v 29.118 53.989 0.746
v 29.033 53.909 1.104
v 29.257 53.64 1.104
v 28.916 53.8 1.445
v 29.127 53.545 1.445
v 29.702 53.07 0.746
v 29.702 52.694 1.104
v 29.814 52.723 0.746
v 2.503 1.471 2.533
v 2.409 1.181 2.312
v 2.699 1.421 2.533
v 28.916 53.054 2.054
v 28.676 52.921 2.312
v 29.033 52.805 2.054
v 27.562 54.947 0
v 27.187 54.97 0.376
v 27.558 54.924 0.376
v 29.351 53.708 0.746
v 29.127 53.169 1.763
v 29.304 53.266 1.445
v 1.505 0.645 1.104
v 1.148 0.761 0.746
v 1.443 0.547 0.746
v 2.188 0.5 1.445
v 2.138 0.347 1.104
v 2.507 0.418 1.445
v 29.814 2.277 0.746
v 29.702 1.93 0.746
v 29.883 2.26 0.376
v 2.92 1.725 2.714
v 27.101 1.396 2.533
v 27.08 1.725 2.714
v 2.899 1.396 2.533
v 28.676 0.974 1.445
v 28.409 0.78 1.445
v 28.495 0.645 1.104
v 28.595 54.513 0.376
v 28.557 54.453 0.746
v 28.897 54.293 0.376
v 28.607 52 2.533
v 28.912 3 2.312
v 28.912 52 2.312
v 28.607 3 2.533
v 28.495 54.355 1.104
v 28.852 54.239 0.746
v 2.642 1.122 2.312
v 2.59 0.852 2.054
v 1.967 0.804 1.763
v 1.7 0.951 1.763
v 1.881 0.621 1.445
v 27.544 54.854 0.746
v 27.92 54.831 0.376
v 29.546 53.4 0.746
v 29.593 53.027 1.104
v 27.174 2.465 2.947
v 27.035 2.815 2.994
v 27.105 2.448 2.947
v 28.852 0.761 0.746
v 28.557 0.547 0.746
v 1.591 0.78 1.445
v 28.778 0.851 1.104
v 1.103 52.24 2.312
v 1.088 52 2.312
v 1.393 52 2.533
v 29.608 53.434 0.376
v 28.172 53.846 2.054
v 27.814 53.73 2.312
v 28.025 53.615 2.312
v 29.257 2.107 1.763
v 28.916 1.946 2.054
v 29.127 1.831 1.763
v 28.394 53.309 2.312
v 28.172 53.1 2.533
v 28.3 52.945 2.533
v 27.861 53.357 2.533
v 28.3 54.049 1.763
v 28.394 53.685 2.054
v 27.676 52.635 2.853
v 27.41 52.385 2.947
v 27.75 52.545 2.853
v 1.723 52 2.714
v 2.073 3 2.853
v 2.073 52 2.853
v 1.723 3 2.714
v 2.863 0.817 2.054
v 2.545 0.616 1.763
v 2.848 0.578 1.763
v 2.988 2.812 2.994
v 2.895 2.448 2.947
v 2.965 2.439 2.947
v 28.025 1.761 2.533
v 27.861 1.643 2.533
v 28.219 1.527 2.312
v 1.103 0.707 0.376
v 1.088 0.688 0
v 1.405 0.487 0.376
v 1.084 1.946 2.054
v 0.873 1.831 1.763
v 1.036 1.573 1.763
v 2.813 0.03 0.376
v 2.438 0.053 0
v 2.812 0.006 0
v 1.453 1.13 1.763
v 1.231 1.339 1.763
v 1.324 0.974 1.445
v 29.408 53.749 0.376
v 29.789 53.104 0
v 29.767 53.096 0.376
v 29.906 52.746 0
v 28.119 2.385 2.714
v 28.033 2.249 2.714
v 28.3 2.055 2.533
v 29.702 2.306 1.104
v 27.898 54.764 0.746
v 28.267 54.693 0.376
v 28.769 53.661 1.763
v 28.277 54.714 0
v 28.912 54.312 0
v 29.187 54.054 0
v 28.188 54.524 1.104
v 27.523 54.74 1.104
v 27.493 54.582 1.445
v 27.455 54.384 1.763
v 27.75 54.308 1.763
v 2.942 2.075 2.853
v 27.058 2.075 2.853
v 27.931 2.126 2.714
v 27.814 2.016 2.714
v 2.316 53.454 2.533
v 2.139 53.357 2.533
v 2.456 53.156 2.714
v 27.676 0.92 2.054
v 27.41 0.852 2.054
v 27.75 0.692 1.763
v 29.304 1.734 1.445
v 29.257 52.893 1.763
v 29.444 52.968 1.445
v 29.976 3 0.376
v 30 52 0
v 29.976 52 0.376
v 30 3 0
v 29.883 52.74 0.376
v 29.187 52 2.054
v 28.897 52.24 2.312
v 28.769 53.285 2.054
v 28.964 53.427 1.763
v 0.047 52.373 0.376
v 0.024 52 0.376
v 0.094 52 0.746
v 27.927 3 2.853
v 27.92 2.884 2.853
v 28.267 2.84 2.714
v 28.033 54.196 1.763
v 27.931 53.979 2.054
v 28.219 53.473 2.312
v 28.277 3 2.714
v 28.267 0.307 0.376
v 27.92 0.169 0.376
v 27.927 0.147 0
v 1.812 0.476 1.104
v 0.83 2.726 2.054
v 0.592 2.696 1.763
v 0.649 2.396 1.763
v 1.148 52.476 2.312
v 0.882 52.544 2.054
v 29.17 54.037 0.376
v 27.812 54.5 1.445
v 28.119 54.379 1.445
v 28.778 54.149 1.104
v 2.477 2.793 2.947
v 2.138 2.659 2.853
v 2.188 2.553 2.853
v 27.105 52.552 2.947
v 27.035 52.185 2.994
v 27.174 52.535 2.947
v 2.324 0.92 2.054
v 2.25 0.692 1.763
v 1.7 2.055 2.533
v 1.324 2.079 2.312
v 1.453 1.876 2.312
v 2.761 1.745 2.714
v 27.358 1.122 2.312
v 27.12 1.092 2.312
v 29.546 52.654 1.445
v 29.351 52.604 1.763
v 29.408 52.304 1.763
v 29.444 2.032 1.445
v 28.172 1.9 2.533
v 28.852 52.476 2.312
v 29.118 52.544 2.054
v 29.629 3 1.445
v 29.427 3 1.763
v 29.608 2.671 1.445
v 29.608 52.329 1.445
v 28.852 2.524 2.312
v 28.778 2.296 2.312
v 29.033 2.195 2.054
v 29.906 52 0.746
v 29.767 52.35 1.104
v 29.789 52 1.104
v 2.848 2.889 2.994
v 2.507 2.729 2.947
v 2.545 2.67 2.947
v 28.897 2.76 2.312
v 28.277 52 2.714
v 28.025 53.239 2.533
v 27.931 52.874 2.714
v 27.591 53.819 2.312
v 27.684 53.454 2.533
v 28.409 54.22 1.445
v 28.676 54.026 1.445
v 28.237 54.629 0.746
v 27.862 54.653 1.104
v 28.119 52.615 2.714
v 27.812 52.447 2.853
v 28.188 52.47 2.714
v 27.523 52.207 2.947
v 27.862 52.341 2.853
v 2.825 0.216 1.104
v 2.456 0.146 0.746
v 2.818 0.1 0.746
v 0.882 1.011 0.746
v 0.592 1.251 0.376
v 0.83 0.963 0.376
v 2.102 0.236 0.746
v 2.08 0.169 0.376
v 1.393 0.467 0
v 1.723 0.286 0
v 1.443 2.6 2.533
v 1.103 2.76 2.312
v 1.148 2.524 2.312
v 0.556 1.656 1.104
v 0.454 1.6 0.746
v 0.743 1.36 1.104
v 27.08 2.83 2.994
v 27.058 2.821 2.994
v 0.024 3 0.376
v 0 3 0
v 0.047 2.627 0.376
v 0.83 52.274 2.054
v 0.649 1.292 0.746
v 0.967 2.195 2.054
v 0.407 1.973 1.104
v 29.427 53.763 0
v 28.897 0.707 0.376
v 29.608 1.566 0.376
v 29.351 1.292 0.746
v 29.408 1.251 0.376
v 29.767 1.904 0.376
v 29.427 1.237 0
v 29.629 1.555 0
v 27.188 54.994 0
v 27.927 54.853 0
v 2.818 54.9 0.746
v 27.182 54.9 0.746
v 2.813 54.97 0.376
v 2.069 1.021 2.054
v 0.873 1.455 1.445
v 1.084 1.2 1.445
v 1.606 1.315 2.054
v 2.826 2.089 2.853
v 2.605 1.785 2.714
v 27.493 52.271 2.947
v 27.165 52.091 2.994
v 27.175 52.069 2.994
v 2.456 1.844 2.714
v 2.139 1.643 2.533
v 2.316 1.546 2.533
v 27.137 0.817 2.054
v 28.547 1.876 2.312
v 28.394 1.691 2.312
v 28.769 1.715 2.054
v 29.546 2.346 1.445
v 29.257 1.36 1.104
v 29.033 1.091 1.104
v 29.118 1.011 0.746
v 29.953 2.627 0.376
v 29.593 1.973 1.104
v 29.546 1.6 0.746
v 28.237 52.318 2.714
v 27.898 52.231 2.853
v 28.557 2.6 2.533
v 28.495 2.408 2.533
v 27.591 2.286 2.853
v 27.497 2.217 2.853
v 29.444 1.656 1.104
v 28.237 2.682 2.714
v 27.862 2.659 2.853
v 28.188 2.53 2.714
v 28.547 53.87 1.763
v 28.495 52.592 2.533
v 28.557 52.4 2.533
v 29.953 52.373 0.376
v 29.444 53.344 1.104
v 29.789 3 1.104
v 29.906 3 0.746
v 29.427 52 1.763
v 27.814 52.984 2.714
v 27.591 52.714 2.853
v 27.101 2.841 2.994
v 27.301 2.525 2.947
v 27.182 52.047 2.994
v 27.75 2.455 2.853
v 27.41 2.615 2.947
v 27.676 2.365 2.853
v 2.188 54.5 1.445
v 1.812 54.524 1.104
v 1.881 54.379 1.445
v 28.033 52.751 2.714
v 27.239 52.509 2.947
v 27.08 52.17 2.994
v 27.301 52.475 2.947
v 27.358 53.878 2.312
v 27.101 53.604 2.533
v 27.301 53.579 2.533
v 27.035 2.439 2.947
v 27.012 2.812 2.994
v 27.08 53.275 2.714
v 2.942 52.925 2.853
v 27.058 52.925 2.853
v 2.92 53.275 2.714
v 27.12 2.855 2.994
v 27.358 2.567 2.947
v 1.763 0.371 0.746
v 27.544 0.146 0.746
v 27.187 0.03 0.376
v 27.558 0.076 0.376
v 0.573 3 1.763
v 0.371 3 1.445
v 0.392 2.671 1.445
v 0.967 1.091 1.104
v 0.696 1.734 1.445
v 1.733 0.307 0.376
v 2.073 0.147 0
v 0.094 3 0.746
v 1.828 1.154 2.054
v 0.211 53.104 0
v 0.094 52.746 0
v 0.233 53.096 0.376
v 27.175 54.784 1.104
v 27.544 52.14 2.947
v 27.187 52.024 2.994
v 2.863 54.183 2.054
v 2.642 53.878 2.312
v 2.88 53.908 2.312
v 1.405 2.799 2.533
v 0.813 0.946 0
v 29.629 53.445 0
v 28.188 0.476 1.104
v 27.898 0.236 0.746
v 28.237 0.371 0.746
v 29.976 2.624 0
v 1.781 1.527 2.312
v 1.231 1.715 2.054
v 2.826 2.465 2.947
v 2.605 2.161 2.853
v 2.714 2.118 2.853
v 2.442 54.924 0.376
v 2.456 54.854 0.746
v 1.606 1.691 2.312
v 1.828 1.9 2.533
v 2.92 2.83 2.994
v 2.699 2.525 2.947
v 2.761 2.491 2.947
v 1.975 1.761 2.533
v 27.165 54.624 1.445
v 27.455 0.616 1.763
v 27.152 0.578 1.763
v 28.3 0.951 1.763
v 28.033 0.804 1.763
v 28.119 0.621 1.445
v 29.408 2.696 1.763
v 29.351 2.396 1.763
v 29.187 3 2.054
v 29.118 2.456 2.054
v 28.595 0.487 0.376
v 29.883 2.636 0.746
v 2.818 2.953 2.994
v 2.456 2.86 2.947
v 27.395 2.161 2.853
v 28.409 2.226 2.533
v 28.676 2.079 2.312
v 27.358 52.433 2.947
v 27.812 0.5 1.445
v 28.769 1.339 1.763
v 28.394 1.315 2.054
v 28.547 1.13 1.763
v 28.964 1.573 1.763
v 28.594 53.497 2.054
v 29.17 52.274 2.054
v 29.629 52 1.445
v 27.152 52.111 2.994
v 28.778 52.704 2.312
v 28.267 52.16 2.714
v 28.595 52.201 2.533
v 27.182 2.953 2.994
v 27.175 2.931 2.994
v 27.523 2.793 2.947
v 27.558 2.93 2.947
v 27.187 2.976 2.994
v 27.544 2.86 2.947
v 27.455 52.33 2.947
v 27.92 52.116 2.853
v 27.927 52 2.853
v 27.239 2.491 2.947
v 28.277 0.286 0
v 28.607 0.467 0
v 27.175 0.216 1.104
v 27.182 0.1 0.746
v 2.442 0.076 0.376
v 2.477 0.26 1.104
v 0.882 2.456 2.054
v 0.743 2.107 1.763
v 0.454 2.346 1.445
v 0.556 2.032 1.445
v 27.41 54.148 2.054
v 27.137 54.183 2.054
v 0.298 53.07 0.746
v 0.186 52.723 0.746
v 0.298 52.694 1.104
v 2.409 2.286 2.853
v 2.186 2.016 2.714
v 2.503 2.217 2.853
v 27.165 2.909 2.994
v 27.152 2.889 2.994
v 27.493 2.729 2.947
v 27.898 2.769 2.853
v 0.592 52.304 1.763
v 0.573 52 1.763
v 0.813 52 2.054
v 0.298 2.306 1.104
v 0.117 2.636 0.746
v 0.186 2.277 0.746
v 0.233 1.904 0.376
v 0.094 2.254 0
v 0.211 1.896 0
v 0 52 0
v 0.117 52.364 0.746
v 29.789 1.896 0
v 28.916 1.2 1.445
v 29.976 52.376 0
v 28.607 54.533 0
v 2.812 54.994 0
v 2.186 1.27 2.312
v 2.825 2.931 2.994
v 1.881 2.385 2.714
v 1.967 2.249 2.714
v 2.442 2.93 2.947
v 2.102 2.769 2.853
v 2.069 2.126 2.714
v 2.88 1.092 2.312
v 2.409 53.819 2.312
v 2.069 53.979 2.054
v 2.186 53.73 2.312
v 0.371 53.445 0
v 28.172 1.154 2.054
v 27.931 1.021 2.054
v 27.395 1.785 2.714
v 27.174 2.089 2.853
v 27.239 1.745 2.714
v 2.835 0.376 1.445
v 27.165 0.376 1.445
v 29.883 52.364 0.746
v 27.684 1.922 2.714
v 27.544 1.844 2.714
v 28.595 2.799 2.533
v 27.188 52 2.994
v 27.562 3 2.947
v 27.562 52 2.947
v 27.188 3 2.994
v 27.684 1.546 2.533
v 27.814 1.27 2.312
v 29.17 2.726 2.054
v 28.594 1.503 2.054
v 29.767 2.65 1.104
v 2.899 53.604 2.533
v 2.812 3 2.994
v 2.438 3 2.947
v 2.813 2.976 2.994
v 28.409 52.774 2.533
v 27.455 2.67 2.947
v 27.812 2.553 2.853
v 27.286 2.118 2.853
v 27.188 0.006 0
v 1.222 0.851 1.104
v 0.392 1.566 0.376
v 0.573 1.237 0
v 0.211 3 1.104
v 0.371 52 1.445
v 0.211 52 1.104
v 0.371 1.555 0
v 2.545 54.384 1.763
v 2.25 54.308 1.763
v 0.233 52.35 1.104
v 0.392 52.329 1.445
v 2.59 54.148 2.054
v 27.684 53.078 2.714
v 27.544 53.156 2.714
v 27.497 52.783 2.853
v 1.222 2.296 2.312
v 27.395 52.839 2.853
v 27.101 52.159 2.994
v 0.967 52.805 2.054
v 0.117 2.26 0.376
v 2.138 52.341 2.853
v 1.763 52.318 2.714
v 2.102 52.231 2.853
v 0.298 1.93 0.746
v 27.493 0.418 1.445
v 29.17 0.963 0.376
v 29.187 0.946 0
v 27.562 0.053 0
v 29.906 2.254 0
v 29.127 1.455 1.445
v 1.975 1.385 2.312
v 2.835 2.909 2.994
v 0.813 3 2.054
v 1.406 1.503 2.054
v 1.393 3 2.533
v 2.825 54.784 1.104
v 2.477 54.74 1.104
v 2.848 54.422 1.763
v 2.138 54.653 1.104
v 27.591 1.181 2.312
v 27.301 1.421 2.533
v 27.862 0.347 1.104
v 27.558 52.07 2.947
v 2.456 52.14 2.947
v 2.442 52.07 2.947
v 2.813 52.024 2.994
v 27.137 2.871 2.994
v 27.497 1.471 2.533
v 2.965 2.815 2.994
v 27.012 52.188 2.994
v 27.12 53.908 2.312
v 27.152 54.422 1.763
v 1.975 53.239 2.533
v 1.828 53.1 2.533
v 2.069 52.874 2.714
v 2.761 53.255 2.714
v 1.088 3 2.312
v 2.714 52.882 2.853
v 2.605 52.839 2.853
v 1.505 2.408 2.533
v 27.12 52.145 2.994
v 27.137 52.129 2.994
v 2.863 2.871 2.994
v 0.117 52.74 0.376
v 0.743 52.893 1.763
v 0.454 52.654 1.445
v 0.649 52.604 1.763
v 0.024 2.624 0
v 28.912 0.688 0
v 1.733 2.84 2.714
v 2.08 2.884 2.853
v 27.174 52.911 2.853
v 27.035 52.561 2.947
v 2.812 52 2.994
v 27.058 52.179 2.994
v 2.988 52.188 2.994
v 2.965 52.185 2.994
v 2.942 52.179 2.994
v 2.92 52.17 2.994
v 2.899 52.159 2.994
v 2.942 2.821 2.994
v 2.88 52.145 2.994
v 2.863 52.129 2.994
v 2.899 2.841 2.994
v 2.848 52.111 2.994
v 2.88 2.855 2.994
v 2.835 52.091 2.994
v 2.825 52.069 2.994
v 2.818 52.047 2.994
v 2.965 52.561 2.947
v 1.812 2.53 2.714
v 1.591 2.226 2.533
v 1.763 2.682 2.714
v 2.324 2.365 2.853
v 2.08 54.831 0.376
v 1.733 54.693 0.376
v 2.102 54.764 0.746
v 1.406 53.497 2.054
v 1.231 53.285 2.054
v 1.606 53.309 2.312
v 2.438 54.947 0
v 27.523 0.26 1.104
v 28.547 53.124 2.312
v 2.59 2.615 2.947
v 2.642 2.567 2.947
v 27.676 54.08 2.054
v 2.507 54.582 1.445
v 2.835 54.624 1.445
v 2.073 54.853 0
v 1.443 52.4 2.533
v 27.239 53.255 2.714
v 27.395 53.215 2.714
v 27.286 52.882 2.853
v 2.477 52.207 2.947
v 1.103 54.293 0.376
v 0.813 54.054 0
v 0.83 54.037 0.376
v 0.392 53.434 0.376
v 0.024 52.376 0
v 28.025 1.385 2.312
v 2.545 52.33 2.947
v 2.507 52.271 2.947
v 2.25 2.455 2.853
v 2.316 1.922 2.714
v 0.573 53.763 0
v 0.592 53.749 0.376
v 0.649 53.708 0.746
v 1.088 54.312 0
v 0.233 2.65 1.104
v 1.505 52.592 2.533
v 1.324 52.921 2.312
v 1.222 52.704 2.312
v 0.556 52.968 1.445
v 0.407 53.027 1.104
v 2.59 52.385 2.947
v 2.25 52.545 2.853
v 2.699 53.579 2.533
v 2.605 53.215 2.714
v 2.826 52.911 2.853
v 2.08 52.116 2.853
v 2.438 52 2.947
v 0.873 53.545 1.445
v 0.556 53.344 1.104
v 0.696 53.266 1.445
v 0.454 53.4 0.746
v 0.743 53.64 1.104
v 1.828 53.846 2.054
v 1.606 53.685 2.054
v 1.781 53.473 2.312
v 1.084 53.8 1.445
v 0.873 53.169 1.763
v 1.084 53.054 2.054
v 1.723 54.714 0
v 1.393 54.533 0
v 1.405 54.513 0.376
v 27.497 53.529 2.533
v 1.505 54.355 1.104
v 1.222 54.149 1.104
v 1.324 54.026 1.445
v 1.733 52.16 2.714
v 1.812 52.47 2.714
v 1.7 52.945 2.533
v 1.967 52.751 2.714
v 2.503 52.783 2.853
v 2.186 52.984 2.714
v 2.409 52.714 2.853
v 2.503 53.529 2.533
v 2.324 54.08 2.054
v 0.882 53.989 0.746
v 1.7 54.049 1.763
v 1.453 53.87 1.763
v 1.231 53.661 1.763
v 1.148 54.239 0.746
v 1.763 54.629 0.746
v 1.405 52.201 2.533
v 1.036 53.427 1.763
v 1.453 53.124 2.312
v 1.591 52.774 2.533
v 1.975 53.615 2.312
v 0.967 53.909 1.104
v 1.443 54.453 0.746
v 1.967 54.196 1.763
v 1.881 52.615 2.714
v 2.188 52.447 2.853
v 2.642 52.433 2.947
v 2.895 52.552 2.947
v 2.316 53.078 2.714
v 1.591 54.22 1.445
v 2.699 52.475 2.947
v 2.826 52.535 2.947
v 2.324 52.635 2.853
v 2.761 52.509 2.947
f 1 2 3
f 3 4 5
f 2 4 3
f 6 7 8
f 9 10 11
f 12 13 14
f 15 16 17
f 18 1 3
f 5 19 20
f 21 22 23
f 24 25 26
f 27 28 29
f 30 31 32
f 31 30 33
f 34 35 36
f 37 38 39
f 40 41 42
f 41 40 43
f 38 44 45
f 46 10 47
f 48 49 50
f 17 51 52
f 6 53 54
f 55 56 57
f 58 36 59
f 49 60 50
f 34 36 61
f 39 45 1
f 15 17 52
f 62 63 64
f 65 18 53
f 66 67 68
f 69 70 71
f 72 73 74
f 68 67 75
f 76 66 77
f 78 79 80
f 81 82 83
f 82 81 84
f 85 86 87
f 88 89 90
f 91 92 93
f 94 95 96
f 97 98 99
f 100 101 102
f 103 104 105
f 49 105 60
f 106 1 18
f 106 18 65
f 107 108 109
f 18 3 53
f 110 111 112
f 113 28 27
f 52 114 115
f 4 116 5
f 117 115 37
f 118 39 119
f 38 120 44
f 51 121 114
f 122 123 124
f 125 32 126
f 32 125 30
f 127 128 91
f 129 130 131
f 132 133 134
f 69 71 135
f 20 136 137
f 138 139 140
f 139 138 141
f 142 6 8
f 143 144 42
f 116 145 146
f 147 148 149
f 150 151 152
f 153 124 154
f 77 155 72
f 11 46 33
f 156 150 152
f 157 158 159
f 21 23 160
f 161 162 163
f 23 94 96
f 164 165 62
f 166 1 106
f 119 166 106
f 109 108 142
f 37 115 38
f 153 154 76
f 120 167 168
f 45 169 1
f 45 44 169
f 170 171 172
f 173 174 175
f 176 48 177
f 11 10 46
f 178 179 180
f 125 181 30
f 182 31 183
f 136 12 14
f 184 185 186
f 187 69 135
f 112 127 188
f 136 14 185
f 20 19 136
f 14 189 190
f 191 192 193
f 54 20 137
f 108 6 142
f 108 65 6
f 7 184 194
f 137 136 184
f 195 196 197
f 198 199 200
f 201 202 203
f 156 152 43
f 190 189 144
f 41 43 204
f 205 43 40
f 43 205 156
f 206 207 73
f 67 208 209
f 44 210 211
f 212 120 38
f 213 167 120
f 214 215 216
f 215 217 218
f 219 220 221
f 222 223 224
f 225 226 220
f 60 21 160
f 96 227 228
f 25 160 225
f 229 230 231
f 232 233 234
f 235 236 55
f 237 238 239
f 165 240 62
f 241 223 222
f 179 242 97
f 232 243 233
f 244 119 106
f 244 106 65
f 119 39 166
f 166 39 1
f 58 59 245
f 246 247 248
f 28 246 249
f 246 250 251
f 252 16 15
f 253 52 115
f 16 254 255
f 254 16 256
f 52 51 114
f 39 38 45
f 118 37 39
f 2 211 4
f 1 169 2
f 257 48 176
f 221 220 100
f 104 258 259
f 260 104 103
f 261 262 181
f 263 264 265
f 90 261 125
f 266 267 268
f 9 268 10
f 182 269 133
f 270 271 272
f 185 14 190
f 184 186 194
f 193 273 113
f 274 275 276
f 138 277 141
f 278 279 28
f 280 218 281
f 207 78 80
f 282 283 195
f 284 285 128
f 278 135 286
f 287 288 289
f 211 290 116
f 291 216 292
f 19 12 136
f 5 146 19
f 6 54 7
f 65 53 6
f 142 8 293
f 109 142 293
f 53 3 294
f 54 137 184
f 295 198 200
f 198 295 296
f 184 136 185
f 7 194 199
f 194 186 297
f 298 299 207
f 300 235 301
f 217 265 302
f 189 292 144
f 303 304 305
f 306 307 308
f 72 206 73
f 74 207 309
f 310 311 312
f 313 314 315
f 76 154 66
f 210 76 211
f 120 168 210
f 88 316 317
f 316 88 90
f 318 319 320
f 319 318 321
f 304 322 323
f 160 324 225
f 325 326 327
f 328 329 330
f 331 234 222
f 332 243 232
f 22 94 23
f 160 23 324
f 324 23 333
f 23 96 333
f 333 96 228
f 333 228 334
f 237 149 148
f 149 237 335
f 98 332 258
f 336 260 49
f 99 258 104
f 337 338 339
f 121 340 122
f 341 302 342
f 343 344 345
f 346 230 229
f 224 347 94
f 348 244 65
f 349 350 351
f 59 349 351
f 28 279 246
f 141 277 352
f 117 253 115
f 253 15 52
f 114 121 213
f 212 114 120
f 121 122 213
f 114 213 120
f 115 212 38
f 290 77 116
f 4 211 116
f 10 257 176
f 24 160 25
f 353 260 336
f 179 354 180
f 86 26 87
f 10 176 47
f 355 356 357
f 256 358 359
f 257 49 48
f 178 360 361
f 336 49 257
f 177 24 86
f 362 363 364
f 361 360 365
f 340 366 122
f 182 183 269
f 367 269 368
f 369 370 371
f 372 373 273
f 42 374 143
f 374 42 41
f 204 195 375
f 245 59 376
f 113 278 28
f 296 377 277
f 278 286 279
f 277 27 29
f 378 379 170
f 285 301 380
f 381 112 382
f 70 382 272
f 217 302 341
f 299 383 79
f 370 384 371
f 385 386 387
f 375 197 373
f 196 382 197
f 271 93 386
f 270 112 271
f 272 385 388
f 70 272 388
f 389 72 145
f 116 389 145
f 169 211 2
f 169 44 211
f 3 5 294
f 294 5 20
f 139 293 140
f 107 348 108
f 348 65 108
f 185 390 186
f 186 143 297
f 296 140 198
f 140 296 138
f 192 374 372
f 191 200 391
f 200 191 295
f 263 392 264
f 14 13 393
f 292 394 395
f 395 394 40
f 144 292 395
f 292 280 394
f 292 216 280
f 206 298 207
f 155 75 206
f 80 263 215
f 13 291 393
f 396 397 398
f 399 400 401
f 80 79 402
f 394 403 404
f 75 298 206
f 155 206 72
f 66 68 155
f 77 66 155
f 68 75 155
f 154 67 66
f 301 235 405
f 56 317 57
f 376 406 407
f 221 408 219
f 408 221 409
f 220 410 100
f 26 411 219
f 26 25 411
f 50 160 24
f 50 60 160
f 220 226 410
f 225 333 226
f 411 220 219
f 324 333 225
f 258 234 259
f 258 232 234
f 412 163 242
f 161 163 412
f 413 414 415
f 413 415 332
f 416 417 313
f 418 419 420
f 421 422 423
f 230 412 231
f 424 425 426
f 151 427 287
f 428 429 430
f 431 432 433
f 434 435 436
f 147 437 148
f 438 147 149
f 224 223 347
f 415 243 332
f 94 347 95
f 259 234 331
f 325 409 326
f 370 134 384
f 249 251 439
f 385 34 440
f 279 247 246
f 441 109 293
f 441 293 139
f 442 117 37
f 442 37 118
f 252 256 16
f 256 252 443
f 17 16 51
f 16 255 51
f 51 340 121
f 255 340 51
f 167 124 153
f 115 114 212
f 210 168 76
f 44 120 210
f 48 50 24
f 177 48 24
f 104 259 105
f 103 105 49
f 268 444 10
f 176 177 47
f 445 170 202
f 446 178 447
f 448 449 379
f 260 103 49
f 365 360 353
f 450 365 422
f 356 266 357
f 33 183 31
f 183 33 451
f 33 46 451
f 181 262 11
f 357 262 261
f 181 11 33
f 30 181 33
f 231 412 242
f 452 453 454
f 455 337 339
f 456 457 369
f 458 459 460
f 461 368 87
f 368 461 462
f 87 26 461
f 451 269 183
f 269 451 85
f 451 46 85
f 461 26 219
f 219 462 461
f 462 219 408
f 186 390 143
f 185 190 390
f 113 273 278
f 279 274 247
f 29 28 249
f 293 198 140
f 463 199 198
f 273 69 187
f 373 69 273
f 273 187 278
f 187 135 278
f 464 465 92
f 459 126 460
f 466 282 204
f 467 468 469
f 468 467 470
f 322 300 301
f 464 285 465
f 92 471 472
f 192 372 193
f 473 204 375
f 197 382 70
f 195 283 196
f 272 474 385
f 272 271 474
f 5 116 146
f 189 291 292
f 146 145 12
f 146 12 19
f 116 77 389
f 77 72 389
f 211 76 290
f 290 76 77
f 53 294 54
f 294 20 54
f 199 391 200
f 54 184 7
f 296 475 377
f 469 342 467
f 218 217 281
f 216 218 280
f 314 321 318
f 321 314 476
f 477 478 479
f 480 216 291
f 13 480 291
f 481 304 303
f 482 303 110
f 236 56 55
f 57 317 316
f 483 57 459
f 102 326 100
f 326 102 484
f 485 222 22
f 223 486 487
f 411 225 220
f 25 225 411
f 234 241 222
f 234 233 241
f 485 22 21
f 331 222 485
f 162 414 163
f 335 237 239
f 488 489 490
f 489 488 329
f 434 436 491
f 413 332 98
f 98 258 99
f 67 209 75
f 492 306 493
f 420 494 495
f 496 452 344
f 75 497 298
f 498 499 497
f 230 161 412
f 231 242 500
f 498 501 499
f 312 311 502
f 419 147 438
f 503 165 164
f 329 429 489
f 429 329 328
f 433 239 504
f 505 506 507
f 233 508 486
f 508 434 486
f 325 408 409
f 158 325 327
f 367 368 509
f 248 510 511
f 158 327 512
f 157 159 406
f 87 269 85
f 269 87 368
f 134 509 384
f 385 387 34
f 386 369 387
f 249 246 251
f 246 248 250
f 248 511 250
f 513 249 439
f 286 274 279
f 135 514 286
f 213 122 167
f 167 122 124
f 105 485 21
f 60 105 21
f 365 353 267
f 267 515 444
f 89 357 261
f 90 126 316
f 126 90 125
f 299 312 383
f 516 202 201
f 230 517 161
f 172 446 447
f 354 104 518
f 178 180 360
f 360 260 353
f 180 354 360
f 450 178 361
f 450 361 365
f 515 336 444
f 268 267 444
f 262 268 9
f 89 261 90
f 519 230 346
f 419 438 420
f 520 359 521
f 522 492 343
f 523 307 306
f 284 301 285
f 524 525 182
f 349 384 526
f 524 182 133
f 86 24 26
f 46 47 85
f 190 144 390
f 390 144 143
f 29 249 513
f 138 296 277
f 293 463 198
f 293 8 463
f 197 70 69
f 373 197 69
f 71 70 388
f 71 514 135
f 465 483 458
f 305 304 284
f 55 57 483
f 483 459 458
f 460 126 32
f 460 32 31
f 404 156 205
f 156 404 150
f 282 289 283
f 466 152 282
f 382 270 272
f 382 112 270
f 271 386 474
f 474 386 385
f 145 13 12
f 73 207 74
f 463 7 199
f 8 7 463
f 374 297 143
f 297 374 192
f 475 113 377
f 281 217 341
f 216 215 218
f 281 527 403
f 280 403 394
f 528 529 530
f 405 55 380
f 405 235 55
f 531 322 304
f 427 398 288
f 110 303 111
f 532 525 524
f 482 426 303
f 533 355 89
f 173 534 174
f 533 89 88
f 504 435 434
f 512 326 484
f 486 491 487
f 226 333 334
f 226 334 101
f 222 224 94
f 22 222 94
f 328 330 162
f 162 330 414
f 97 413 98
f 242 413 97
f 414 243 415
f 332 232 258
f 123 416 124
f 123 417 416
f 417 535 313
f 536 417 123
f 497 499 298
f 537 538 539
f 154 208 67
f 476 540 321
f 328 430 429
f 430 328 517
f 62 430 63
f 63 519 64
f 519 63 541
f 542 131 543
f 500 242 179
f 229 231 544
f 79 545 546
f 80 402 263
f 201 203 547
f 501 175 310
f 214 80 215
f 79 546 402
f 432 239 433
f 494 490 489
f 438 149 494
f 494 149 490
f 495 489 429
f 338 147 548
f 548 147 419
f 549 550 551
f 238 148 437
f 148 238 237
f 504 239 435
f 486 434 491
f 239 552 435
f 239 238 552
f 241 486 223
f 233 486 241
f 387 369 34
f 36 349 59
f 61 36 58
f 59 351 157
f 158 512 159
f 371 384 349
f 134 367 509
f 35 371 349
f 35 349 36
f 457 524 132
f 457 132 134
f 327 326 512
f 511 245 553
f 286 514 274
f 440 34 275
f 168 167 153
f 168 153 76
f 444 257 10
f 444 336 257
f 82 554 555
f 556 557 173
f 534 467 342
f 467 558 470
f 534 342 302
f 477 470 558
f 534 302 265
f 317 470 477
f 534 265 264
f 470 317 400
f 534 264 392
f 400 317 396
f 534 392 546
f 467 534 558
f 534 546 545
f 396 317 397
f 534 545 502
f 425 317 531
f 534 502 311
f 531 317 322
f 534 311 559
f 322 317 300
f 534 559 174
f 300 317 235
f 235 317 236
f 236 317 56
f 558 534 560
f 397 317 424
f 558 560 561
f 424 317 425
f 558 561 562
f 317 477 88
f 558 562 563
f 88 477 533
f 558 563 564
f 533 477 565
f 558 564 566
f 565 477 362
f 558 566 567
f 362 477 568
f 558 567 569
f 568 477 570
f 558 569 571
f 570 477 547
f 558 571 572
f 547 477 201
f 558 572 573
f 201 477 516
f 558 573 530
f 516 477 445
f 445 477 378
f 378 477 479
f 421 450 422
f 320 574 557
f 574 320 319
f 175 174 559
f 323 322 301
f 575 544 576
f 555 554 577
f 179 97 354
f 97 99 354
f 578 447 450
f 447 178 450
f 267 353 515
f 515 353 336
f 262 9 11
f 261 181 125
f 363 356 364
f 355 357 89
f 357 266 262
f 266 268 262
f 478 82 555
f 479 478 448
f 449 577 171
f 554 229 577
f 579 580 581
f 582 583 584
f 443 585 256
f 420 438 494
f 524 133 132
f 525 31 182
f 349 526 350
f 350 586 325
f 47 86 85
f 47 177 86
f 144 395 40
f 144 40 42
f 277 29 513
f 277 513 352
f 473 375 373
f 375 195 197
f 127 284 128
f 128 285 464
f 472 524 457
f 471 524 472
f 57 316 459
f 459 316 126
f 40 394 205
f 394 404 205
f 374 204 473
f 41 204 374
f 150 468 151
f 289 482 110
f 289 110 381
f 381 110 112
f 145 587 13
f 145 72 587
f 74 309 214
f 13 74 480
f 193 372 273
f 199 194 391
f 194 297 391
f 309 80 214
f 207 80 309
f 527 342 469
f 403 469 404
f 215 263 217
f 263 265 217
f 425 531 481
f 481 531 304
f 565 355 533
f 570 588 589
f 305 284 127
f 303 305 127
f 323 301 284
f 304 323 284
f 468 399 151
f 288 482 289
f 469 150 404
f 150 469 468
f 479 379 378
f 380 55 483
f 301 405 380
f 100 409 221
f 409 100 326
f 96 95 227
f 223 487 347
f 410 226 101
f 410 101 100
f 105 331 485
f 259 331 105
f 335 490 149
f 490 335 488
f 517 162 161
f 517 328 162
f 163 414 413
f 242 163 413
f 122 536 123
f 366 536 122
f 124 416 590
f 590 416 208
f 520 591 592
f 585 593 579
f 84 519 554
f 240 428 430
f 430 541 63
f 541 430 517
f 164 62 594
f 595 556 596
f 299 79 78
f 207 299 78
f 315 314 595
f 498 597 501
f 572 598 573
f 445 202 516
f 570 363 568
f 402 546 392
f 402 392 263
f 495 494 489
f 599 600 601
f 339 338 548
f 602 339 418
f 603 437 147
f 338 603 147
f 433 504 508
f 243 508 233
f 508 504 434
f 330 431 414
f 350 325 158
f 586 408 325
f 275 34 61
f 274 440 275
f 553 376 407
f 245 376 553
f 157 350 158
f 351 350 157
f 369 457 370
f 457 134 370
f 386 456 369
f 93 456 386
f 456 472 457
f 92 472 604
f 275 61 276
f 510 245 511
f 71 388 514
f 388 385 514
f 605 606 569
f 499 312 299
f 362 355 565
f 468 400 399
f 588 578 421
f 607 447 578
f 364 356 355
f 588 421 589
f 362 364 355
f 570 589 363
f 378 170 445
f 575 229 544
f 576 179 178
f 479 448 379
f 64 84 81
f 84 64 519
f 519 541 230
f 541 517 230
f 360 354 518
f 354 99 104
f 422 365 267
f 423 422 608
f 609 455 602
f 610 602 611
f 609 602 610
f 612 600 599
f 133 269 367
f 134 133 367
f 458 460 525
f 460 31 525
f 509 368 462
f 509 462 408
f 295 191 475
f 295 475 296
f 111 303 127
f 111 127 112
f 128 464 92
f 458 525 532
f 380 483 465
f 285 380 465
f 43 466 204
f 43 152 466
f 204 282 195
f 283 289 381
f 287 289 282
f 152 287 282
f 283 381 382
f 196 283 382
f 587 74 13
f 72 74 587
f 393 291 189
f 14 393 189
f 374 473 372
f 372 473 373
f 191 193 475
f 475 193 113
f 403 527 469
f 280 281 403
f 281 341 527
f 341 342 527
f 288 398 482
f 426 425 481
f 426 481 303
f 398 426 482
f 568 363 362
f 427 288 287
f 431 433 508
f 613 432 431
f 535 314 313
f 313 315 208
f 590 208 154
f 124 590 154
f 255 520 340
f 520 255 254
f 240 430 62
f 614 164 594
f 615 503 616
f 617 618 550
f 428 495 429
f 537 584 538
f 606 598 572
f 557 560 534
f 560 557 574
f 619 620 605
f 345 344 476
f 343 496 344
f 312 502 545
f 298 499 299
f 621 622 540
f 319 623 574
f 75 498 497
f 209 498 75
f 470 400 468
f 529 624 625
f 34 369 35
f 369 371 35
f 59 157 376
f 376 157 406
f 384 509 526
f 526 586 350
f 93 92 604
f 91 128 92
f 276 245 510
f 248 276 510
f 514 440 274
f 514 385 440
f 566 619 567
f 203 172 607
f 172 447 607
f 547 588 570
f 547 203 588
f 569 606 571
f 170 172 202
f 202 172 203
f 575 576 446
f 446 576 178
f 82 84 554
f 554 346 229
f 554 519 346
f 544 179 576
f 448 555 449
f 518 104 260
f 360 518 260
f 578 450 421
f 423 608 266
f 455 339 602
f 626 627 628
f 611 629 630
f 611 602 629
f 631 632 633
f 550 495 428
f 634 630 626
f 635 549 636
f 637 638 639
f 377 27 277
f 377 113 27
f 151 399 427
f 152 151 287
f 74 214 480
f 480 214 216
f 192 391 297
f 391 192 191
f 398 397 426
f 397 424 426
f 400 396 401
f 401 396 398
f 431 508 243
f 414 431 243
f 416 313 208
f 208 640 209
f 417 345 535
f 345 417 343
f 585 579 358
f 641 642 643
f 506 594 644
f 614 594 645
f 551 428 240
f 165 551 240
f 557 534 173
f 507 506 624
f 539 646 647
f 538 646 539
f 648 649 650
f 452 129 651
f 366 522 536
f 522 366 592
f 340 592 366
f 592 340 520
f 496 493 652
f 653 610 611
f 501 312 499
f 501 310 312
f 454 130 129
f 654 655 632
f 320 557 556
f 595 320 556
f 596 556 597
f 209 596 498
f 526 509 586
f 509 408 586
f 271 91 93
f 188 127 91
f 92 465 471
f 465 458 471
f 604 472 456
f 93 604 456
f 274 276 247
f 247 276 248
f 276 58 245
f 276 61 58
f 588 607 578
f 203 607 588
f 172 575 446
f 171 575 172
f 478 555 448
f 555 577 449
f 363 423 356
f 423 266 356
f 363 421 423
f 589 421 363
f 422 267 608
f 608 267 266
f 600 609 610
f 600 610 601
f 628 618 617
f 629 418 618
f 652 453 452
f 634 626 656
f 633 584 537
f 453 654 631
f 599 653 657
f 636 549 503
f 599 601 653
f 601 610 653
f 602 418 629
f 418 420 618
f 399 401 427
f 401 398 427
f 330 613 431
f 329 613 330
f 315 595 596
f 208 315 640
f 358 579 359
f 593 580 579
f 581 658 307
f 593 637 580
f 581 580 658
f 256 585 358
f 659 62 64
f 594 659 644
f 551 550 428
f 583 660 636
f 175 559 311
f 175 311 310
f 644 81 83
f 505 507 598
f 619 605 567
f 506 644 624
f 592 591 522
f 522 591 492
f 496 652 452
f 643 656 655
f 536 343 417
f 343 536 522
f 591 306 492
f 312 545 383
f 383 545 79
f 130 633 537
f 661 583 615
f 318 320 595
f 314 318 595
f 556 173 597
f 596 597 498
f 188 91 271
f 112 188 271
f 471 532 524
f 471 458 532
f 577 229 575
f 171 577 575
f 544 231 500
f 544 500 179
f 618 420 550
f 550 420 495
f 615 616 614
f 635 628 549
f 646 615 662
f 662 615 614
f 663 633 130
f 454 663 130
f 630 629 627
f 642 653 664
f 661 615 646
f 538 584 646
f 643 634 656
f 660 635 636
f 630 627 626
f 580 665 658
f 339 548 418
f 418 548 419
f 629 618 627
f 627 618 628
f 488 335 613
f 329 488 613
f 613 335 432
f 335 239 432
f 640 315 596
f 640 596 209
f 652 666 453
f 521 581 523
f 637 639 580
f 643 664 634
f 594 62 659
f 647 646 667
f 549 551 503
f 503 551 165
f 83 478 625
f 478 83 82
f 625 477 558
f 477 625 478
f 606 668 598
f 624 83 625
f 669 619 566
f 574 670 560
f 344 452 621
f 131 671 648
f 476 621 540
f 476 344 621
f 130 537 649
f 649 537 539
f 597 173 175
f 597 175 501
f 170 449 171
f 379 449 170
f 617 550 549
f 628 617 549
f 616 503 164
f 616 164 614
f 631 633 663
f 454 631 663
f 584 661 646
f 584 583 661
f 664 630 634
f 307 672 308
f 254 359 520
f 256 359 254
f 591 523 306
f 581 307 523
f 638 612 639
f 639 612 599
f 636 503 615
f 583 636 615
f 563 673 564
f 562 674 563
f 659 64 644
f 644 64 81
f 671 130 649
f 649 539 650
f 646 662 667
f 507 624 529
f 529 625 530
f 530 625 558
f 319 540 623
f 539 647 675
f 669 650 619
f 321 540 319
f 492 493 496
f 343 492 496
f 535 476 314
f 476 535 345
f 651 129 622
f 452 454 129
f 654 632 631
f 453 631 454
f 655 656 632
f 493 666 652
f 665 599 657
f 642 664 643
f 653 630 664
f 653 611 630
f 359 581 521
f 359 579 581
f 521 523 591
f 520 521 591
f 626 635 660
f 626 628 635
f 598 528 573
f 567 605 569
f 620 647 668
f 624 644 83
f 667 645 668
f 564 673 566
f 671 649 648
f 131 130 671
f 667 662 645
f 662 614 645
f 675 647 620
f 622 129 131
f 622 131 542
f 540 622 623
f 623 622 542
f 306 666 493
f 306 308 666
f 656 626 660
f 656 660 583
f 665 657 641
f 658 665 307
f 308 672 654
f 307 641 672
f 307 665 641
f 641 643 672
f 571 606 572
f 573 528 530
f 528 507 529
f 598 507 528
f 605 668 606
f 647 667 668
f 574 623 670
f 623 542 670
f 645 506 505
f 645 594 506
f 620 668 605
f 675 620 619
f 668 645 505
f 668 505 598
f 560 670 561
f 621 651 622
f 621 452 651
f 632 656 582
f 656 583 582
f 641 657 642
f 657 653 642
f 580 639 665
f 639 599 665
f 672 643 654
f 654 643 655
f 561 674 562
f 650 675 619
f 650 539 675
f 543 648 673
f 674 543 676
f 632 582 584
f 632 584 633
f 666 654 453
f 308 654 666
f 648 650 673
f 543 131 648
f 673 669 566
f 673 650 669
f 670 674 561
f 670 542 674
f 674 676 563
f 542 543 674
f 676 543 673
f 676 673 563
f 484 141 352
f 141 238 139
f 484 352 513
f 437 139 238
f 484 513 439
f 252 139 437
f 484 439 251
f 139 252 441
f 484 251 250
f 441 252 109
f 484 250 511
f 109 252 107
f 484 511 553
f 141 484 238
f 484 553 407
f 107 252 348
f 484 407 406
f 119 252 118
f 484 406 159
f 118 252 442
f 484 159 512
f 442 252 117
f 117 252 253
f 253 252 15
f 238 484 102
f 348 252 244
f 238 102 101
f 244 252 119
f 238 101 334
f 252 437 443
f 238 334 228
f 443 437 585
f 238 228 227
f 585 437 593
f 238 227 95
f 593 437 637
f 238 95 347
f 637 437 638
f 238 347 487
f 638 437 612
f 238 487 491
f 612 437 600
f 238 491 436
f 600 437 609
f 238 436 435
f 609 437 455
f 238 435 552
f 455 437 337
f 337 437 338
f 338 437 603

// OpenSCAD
// cube_r_o.scad
// Variables Rechteck mit Rundung aussen/oben
$fn=50;
// breite = X-Achse
// laenge = Y-Achse
// radius = Höhe & Radius der Rundung

module eckoben (breite, laenge, radius) {
    difference() {
        hull() {
            translate([radius,radius,0])
            sphere(radius);
            translate([breite - radius,radius,0])
            sphere(radius);
            translate([radius, laenge - radius,0])
            sphere(radius);
            translate([breite - radius, laenge - radius,0])
            sphere(radius);
        } // hull
        translate([0,0, -radius])
        cube ([breite, laenge, radius]);
    } // difference
} // module

eckoben (30, 55, 3); // X, Y, Radius oben
